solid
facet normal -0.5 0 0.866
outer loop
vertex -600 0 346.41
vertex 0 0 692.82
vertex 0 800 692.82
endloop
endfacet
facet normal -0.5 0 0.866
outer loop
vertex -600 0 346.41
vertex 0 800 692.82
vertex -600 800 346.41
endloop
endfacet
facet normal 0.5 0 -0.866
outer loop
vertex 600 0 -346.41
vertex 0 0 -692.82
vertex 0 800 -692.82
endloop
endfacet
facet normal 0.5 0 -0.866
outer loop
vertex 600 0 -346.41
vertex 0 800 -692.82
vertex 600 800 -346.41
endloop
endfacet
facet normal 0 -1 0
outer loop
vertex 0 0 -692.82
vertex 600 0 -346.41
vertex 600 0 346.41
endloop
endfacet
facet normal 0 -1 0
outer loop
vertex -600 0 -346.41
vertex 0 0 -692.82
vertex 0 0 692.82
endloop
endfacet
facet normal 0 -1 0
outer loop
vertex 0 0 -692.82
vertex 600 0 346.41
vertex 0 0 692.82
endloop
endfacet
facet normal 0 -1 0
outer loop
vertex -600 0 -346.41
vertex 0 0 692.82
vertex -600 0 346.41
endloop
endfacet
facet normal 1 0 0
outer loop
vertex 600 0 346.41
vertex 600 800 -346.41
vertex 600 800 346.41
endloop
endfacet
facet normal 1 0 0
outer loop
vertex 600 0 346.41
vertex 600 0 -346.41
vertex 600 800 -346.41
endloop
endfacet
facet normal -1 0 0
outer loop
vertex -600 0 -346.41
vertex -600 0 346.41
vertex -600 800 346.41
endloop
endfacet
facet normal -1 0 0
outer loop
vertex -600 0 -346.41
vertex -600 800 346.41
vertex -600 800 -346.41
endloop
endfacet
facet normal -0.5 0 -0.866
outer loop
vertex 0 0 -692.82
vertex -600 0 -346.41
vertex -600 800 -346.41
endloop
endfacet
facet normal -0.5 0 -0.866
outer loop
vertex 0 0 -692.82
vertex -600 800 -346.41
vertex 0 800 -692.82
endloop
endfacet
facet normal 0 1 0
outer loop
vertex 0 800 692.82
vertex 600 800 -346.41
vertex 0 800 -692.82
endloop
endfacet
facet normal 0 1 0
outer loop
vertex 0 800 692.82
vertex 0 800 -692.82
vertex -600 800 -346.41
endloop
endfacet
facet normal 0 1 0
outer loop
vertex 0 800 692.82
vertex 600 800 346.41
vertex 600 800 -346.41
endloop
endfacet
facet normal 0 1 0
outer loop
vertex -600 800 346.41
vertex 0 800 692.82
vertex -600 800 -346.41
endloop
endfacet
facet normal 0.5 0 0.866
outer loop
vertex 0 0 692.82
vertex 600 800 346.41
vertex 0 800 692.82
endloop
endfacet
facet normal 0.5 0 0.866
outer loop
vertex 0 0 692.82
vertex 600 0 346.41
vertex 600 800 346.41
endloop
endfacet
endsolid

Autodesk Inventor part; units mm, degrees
ref_plane "YZ Plane" through (0, 0, 0) normal (1, 0, 0) x (0, 1, 0)
ref_plane "XZ Plane" through (0, 0, 0) normal (0, 1, 0) x (-1, 0, 0)
ref_plane "XY Plane" through (0, 0, 0) normal (0, 0, 1) x (1, 0, 0)
sketch "Sketch1" plane through (0, 0, 0) normal (0, 1, 0) x (-1, 0, 0)
  line L0 (0, -692.8203) -> (-600, -346.4102)
  line L1 (-600, -346.4102) -> (-600, 346.4102)
  line L2 (-600, 346.4102) -> (0, 692.8203)
  line L3 (0, 692.8203) -> (600, 346.4102)
  line L4 (600, 346.4102) -> (600, -346.4102)
  line L5 (600, -346.4102) -> (0, -692.8203)
  point P0 (0, 0)
  point P1 (0, 0)
  dimension "d0" = 1200
extrude "Extrusion1" add sketch "Sketch1" along normal blind 800
sketch "Sketch2" plane through (600, 0, 346.4102) normal (0.5, 0, 0.866) x (0.866, 0, -0.5)
  line L0 (-692.8203, 0) -> (-692.8203, 800) projected
  line L1 (-692.8203, 400) -> (0, 400)
  line L2 (0, 0) -> (0, 800) projected
  point P0 (-346.4102, 0)
  dimension "d3" = 400
sketch "Sketch3" plane through (600, 0, 346.4102) normal (1, 0, 0) x (0, 0, -1)
  line L0 (0, 0) -> (0, 800) projected
  line L1 (0, 400) -> (692.8203, 400)
  line L2 (692.8203, 0) -> (692.8203, 800) projected
  point P0 (346.4102, 0)
sketch "Sketch4" plane through (0, 0, -692.8203) normal (0.5, 0, -0.866) x (-0.866, 0, -0.5)
  line L0 (-692.8203, 0) -> (-692.8203, 800) projected
  line L1 (-692.8203, 400) -> (0, 400)
  line L2 (0, 0) -> (0, 800) projected
  point P0 (-346.4102, 0)
sketch "Sketch5" plane through (0, 0, 692.8203) normal (-0.5, 0, 0.866) x (0.866, 0, 0.5)
  line L0 (0, 400) -> (-692.8203, 400) projected
  point P0 (-346.4102, 0)
sketch "Sketch6" plane through (-600, 0, -346.4102) normal (-1, 0, 0) x (0, 0, 1)
  line L0 (692.8203, 400) -> (0, 400) projected
  point P0 (346.4102, 0)
sketch "Sketch7" plane through (-600, 0, -346.4102) normal (-0.5, 0, -0.866) x (-0.866, 0, 0.5)
  line L0 (0, 400) -> (-692.8203, 400) projected
  point P0 (-346.4102, 0)
